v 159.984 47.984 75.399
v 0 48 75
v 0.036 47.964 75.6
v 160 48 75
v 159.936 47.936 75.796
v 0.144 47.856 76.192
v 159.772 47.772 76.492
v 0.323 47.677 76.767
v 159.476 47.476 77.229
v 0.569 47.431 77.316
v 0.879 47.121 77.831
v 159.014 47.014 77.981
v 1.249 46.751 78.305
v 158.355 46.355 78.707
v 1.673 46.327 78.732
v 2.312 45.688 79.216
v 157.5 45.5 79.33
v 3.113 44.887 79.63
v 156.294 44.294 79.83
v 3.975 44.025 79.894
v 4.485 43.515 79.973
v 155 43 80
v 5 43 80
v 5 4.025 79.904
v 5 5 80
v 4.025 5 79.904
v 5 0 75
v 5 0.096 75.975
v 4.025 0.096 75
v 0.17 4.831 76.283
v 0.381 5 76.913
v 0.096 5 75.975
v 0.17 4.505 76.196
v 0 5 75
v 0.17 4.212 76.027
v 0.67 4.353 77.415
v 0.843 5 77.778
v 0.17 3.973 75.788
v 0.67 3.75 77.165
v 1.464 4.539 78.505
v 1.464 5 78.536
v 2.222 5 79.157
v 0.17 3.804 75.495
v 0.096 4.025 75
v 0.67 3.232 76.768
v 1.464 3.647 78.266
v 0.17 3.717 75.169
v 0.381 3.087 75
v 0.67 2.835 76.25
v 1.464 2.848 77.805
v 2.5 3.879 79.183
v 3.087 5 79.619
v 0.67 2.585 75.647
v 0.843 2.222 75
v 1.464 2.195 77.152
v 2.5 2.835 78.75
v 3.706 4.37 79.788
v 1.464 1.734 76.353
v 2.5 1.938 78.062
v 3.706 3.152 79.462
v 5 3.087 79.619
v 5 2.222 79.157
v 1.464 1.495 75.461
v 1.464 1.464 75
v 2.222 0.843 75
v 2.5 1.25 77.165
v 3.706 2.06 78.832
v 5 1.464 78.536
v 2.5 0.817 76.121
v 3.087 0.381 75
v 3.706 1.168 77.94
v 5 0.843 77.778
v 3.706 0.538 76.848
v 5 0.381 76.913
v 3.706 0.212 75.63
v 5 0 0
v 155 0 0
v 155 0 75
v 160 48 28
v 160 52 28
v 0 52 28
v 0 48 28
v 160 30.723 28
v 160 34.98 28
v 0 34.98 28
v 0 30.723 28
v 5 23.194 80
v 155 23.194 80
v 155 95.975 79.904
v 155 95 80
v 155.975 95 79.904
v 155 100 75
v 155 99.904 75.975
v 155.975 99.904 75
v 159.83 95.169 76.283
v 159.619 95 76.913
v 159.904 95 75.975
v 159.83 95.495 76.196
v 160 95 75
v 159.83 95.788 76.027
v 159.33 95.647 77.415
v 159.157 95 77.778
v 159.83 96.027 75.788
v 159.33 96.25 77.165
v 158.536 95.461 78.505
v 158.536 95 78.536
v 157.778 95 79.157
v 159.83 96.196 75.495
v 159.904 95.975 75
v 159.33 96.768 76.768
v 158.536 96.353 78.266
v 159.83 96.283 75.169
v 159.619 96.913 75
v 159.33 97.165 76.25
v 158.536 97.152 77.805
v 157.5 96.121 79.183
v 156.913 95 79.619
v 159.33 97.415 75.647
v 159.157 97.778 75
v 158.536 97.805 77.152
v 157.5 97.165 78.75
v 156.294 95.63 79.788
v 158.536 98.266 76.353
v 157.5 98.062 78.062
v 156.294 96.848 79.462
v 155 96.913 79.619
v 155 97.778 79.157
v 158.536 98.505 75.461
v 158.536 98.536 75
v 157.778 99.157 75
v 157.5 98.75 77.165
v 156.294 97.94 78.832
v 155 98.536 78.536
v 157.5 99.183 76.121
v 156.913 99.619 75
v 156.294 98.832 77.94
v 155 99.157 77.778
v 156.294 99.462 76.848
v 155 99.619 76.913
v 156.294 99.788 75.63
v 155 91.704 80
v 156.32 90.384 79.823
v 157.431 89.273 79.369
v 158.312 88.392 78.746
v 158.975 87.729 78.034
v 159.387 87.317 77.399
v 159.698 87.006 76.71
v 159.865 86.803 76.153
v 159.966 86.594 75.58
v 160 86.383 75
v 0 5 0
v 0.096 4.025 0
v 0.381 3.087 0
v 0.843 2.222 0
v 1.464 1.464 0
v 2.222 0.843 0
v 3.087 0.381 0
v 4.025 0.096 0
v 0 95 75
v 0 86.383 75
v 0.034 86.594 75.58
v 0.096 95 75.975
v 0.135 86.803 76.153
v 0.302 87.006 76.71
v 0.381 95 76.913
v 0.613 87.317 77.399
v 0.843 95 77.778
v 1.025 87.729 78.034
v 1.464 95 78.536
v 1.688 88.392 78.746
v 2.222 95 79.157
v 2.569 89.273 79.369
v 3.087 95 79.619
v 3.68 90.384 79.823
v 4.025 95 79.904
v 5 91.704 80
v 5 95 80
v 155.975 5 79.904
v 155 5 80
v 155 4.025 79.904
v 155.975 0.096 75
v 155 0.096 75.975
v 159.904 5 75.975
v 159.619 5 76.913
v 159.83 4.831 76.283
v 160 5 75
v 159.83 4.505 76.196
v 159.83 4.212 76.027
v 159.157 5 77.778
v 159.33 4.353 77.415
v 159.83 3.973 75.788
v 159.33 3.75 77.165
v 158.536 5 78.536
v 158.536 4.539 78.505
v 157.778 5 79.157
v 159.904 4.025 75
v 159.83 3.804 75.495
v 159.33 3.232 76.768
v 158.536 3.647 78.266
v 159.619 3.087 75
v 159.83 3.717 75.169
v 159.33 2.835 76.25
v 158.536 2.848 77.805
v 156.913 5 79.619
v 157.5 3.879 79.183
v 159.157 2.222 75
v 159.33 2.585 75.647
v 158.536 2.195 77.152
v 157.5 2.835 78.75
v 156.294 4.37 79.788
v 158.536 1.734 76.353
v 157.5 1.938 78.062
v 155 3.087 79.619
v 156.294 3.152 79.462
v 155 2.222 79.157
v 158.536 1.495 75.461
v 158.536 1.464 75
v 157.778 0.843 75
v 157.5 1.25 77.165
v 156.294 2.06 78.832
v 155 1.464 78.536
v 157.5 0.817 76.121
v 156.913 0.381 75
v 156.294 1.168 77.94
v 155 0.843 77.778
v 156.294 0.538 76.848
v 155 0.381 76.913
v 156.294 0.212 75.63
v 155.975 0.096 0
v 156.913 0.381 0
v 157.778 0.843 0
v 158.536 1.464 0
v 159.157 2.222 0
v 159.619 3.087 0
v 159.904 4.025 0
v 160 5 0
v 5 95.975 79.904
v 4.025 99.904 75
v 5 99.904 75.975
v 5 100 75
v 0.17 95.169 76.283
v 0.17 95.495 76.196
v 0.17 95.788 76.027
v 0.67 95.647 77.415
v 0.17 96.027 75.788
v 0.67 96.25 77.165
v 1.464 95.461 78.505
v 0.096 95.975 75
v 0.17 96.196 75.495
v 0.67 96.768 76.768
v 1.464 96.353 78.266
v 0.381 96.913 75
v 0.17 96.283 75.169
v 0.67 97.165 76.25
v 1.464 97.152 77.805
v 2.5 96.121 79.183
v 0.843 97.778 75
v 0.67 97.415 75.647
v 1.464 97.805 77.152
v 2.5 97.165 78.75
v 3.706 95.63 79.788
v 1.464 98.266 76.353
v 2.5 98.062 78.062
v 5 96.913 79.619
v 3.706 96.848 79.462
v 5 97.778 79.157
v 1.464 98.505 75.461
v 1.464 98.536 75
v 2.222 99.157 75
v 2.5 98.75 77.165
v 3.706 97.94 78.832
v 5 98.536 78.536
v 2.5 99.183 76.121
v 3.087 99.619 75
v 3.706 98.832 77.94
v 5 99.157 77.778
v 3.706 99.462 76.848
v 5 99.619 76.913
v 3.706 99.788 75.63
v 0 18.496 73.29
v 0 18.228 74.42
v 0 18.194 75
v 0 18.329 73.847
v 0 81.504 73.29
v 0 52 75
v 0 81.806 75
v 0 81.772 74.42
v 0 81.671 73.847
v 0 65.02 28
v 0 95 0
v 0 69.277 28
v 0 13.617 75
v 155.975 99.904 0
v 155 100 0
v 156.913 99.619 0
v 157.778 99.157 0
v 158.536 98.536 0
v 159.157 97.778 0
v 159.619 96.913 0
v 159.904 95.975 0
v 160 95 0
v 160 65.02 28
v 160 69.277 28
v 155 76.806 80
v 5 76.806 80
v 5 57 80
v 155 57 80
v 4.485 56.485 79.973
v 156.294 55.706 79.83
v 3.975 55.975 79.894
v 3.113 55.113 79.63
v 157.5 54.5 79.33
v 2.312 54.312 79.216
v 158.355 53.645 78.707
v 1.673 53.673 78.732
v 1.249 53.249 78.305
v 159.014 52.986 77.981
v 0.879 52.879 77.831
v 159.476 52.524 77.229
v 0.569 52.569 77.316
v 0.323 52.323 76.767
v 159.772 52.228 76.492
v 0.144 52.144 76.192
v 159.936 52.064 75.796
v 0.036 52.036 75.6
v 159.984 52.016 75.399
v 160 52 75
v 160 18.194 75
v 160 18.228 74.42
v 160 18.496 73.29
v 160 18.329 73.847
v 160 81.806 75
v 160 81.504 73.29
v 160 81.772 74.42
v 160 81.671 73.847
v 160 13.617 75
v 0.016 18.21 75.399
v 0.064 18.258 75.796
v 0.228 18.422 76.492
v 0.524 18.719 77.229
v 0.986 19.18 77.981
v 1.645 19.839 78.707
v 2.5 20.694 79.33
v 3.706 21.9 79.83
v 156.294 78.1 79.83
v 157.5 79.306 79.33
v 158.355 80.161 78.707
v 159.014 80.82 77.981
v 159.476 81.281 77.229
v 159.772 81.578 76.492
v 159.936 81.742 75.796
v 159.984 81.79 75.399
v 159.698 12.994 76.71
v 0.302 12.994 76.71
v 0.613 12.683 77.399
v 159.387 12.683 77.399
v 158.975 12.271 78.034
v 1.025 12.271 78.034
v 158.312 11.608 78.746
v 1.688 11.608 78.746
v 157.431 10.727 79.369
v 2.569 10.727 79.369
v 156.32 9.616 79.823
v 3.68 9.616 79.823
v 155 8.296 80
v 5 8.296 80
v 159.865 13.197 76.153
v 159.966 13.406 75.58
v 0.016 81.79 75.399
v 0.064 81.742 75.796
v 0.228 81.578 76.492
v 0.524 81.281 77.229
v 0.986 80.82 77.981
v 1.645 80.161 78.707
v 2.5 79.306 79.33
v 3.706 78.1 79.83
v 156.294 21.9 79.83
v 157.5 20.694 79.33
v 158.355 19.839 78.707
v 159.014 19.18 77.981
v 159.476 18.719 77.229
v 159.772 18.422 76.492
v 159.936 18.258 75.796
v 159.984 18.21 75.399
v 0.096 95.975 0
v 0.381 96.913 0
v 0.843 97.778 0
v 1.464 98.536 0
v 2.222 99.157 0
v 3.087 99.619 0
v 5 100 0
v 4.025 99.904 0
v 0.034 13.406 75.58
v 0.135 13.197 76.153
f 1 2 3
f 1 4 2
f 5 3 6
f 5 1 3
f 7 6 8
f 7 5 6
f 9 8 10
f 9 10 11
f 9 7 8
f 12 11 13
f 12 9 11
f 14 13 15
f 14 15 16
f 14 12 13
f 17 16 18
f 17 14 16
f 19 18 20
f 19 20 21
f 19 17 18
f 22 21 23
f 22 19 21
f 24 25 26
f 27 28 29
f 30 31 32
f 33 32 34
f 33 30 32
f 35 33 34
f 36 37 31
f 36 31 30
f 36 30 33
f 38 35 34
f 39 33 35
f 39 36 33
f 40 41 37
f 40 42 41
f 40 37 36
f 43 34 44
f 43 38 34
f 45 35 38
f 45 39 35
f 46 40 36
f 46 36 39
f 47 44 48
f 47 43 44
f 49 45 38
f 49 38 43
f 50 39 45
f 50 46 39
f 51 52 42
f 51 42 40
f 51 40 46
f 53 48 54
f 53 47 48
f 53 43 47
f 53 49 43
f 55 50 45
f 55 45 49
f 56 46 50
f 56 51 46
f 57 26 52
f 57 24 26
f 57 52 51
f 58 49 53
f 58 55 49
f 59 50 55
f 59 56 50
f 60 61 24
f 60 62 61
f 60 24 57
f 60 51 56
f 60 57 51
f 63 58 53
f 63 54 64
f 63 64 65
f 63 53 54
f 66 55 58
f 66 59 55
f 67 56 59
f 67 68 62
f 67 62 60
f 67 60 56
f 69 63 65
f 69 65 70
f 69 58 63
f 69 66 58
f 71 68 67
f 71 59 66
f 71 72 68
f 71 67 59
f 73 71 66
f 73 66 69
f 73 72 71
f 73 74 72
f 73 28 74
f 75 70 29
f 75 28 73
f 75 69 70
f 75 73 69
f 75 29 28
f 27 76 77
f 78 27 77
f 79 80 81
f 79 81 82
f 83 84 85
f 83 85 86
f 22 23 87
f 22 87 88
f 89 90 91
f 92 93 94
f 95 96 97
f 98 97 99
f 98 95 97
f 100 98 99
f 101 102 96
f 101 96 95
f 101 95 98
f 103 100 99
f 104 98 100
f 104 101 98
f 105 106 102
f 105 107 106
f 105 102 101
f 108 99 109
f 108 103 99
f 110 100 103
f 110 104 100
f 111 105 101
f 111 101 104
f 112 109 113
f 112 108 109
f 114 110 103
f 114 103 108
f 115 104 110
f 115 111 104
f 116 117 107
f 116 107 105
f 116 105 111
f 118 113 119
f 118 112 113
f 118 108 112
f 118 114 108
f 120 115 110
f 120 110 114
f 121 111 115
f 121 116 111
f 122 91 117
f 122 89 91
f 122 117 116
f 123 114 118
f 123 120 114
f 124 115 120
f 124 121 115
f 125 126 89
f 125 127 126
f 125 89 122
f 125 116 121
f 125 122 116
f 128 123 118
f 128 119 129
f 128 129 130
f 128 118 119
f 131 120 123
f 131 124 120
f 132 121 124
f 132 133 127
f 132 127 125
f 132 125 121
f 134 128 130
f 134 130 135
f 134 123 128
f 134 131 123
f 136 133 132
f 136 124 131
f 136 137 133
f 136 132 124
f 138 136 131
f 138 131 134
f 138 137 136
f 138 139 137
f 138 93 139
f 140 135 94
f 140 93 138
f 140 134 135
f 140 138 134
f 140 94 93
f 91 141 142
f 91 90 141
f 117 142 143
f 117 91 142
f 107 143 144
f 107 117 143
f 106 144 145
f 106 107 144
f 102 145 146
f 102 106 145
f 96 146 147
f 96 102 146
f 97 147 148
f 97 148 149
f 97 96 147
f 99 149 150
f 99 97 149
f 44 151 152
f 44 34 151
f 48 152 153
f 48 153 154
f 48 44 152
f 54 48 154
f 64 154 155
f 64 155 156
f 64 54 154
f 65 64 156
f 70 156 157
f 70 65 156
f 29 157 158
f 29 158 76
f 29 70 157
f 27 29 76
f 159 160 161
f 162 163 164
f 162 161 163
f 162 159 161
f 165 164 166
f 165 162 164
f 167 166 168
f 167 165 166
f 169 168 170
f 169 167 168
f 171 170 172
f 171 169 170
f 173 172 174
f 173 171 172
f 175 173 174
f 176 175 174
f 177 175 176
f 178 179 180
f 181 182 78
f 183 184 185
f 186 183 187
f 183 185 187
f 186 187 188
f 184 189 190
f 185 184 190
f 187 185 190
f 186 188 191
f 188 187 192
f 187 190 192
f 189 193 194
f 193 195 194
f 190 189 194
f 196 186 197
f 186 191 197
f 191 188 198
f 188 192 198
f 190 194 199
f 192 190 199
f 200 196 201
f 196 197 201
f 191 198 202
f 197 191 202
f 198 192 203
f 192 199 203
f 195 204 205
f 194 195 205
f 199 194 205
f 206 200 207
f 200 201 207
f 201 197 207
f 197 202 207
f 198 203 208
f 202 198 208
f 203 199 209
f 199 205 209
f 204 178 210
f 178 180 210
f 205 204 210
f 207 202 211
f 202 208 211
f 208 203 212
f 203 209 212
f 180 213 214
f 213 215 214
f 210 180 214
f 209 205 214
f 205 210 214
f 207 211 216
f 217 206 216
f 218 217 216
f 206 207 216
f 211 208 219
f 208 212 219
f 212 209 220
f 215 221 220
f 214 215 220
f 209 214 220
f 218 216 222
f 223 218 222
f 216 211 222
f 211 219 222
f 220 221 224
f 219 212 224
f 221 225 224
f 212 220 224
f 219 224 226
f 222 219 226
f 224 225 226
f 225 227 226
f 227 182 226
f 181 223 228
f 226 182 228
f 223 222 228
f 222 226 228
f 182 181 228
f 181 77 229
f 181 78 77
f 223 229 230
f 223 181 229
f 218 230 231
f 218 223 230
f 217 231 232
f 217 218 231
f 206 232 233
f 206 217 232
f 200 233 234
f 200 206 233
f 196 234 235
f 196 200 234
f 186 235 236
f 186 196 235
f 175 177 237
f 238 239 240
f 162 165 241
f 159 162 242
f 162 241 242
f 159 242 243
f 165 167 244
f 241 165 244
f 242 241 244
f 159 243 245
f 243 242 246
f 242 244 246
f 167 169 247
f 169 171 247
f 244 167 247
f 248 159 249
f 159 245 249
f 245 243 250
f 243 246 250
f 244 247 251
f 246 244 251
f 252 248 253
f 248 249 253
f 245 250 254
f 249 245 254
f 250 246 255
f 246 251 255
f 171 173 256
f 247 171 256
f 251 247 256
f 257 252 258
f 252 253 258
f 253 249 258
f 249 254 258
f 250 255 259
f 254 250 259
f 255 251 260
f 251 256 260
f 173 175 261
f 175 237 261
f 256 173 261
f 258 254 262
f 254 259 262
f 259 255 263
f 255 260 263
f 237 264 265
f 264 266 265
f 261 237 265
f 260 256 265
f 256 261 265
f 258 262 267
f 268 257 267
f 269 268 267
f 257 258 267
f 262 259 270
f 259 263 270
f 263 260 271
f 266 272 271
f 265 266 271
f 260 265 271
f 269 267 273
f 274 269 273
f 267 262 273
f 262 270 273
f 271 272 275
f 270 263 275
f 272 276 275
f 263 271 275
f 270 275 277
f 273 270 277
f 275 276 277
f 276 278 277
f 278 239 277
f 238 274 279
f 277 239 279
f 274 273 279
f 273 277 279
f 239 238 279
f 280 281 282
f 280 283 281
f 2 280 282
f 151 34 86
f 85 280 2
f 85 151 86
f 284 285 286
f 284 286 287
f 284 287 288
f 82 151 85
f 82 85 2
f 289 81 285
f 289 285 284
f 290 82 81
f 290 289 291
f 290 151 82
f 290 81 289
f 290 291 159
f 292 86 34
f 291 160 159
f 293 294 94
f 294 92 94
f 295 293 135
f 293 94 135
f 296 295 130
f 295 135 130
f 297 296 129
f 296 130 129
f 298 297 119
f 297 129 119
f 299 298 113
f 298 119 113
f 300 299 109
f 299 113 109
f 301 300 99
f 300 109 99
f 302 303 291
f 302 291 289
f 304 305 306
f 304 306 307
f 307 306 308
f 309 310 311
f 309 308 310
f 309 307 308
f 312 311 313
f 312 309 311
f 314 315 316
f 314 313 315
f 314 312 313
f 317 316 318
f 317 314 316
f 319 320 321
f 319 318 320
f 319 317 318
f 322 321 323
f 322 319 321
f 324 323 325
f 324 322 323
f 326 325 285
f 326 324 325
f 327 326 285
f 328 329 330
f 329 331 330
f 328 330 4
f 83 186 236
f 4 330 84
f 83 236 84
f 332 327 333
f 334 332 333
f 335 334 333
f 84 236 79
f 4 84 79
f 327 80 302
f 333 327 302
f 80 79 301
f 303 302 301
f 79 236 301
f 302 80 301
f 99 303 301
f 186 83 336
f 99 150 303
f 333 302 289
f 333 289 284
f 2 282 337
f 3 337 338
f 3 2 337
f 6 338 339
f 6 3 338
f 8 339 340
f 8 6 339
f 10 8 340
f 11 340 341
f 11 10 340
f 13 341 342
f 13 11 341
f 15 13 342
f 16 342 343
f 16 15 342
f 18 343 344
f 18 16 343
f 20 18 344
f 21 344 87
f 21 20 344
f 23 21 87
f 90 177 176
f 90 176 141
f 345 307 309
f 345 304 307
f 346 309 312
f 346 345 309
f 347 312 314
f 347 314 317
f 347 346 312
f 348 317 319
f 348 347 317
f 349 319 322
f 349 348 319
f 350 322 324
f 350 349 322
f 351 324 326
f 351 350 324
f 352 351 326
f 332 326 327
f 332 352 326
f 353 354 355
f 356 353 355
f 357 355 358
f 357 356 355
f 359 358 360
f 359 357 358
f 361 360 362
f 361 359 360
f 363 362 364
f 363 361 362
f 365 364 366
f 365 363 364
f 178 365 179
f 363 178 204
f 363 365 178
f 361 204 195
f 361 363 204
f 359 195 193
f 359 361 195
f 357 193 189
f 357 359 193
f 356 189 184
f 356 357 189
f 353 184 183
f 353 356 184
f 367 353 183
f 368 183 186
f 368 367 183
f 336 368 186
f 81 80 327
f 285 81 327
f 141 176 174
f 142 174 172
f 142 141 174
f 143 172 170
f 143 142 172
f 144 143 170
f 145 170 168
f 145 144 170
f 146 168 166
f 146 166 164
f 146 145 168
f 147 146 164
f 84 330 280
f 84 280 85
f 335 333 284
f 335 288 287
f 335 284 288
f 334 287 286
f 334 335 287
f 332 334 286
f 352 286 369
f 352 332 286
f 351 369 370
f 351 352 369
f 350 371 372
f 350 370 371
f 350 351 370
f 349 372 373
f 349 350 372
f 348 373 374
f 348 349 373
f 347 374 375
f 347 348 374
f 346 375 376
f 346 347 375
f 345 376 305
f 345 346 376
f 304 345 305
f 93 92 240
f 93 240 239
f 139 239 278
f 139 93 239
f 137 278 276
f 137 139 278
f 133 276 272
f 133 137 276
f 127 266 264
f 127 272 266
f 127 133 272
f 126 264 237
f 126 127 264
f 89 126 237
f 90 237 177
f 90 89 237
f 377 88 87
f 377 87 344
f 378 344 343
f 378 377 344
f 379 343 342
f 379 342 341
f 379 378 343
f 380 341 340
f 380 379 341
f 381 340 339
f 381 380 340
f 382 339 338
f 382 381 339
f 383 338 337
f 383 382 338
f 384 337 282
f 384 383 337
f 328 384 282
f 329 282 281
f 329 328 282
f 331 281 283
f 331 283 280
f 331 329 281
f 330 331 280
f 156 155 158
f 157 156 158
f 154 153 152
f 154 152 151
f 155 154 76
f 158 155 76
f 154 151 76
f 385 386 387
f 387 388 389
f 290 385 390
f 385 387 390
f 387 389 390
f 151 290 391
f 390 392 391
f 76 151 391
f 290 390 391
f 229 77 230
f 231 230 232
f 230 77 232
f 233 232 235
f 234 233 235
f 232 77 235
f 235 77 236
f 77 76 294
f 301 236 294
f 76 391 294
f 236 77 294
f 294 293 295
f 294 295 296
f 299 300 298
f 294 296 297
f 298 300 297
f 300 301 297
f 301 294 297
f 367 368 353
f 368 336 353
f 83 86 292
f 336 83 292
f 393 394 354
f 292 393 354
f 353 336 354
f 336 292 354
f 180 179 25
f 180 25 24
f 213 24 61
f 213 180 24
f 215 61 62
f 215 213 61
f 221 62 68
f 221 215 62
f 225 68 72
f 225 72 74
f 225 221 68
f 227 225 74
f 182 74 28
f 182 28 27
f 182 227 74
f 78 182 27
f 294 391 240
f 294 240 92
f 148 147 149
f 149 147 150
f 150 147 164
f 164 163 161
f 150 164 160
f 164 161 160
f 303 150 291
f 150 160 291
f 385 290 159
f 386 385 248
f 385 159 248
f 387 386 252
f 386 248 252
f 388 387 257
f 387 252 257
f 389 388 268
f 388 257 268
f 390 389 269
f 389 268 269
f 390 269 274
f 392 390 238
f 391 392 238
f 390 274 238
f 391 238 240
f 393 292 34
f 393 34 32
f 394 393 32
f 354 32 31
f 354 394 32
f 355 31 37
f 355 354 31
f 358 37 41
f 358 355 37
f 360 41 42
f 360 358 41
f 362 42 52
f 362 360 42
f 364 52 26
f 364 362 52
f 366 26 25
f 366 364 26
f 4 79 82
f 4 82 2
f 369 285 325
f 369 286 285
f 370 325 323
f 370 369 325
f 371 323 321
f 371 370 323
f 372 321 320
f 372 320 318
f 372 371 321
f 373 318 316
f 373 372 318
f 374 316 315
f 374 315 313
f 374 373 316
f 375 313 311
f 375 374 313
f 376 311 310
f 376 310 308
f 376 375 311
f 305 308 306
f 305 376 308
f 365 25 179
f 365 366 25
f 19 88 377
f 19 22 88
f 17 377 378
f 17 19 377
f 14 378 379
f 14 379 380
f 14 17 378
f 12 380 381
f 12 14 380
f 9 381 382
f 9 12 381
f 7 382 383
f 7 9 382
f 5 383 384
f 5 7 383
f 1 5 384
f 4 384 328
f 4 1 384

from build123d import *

# Parameters (mm, degrees)
F0_W     = 160
F0_H     = 100
F1_DEPTH = 80
F2_W     = 4
F2_H     = 52
F3_DEPTH = 160
F4_R     = 5


with BuildPart() as f1:
    # F0 (on Top) → F1 (new body)
    with BuildSketch(Plane.XY):
        with Locations((80, 50)):
            Rectangle(F0_W, F0_H)
    extrude(amount=F1_DEPTH)

    # F2 (on face) → F3 (cut, through all)
    with BuildSketch(Plane(origin=(0, 0, 0), x_dir=(0, -1, 0), z_dir=(-1, 0, 0))):
        Polygon((-65.0198098907, 28), (-83.9462620725, 80), (-88.2029731624, 80), (-69.2765209806, 28), align=None)
        with Locations((-50, 54)):
            Rectangle(F2_W, F2_H)
        Polygon((-30.7234790194, 28), (-11.7970268376, 80), (-16.0537379275, 80), (-34.9801901093, 28), align=None)
    extrude(amount=-F3_DEPTH, mode=Mode.SUBTRACT)

    # F4
    f4_edges = [f1.edges().sort_by_distance(p)[0] for p in [
        (80, 0, 80),
        (80, 100, 80),
        (160, 94.101487, 80),
        (160, 67.973131, 80),
        (160, 32.026869, 80),
        (160, 5.898513, 80),
        (0, 5.898513, 80),
        (0, 32.026869, 80),
        (0, 67.973131, 80),
        (0, 94.101487, 80),
        (160, 100, 40),
        (0, 100, 40),
        (160, 0, 40),
        (0, 0, 40),
        (80, 48, 80),
        (80, 52, 80),
        (80, 83.946262, 80),
        (80, 88.202973, 80),
        (80, 16.053738, 80),
        (80, 11.797027, 80),
    ]]
    fillet(f4_edges, radius=F4_R)


solid = f1.part
